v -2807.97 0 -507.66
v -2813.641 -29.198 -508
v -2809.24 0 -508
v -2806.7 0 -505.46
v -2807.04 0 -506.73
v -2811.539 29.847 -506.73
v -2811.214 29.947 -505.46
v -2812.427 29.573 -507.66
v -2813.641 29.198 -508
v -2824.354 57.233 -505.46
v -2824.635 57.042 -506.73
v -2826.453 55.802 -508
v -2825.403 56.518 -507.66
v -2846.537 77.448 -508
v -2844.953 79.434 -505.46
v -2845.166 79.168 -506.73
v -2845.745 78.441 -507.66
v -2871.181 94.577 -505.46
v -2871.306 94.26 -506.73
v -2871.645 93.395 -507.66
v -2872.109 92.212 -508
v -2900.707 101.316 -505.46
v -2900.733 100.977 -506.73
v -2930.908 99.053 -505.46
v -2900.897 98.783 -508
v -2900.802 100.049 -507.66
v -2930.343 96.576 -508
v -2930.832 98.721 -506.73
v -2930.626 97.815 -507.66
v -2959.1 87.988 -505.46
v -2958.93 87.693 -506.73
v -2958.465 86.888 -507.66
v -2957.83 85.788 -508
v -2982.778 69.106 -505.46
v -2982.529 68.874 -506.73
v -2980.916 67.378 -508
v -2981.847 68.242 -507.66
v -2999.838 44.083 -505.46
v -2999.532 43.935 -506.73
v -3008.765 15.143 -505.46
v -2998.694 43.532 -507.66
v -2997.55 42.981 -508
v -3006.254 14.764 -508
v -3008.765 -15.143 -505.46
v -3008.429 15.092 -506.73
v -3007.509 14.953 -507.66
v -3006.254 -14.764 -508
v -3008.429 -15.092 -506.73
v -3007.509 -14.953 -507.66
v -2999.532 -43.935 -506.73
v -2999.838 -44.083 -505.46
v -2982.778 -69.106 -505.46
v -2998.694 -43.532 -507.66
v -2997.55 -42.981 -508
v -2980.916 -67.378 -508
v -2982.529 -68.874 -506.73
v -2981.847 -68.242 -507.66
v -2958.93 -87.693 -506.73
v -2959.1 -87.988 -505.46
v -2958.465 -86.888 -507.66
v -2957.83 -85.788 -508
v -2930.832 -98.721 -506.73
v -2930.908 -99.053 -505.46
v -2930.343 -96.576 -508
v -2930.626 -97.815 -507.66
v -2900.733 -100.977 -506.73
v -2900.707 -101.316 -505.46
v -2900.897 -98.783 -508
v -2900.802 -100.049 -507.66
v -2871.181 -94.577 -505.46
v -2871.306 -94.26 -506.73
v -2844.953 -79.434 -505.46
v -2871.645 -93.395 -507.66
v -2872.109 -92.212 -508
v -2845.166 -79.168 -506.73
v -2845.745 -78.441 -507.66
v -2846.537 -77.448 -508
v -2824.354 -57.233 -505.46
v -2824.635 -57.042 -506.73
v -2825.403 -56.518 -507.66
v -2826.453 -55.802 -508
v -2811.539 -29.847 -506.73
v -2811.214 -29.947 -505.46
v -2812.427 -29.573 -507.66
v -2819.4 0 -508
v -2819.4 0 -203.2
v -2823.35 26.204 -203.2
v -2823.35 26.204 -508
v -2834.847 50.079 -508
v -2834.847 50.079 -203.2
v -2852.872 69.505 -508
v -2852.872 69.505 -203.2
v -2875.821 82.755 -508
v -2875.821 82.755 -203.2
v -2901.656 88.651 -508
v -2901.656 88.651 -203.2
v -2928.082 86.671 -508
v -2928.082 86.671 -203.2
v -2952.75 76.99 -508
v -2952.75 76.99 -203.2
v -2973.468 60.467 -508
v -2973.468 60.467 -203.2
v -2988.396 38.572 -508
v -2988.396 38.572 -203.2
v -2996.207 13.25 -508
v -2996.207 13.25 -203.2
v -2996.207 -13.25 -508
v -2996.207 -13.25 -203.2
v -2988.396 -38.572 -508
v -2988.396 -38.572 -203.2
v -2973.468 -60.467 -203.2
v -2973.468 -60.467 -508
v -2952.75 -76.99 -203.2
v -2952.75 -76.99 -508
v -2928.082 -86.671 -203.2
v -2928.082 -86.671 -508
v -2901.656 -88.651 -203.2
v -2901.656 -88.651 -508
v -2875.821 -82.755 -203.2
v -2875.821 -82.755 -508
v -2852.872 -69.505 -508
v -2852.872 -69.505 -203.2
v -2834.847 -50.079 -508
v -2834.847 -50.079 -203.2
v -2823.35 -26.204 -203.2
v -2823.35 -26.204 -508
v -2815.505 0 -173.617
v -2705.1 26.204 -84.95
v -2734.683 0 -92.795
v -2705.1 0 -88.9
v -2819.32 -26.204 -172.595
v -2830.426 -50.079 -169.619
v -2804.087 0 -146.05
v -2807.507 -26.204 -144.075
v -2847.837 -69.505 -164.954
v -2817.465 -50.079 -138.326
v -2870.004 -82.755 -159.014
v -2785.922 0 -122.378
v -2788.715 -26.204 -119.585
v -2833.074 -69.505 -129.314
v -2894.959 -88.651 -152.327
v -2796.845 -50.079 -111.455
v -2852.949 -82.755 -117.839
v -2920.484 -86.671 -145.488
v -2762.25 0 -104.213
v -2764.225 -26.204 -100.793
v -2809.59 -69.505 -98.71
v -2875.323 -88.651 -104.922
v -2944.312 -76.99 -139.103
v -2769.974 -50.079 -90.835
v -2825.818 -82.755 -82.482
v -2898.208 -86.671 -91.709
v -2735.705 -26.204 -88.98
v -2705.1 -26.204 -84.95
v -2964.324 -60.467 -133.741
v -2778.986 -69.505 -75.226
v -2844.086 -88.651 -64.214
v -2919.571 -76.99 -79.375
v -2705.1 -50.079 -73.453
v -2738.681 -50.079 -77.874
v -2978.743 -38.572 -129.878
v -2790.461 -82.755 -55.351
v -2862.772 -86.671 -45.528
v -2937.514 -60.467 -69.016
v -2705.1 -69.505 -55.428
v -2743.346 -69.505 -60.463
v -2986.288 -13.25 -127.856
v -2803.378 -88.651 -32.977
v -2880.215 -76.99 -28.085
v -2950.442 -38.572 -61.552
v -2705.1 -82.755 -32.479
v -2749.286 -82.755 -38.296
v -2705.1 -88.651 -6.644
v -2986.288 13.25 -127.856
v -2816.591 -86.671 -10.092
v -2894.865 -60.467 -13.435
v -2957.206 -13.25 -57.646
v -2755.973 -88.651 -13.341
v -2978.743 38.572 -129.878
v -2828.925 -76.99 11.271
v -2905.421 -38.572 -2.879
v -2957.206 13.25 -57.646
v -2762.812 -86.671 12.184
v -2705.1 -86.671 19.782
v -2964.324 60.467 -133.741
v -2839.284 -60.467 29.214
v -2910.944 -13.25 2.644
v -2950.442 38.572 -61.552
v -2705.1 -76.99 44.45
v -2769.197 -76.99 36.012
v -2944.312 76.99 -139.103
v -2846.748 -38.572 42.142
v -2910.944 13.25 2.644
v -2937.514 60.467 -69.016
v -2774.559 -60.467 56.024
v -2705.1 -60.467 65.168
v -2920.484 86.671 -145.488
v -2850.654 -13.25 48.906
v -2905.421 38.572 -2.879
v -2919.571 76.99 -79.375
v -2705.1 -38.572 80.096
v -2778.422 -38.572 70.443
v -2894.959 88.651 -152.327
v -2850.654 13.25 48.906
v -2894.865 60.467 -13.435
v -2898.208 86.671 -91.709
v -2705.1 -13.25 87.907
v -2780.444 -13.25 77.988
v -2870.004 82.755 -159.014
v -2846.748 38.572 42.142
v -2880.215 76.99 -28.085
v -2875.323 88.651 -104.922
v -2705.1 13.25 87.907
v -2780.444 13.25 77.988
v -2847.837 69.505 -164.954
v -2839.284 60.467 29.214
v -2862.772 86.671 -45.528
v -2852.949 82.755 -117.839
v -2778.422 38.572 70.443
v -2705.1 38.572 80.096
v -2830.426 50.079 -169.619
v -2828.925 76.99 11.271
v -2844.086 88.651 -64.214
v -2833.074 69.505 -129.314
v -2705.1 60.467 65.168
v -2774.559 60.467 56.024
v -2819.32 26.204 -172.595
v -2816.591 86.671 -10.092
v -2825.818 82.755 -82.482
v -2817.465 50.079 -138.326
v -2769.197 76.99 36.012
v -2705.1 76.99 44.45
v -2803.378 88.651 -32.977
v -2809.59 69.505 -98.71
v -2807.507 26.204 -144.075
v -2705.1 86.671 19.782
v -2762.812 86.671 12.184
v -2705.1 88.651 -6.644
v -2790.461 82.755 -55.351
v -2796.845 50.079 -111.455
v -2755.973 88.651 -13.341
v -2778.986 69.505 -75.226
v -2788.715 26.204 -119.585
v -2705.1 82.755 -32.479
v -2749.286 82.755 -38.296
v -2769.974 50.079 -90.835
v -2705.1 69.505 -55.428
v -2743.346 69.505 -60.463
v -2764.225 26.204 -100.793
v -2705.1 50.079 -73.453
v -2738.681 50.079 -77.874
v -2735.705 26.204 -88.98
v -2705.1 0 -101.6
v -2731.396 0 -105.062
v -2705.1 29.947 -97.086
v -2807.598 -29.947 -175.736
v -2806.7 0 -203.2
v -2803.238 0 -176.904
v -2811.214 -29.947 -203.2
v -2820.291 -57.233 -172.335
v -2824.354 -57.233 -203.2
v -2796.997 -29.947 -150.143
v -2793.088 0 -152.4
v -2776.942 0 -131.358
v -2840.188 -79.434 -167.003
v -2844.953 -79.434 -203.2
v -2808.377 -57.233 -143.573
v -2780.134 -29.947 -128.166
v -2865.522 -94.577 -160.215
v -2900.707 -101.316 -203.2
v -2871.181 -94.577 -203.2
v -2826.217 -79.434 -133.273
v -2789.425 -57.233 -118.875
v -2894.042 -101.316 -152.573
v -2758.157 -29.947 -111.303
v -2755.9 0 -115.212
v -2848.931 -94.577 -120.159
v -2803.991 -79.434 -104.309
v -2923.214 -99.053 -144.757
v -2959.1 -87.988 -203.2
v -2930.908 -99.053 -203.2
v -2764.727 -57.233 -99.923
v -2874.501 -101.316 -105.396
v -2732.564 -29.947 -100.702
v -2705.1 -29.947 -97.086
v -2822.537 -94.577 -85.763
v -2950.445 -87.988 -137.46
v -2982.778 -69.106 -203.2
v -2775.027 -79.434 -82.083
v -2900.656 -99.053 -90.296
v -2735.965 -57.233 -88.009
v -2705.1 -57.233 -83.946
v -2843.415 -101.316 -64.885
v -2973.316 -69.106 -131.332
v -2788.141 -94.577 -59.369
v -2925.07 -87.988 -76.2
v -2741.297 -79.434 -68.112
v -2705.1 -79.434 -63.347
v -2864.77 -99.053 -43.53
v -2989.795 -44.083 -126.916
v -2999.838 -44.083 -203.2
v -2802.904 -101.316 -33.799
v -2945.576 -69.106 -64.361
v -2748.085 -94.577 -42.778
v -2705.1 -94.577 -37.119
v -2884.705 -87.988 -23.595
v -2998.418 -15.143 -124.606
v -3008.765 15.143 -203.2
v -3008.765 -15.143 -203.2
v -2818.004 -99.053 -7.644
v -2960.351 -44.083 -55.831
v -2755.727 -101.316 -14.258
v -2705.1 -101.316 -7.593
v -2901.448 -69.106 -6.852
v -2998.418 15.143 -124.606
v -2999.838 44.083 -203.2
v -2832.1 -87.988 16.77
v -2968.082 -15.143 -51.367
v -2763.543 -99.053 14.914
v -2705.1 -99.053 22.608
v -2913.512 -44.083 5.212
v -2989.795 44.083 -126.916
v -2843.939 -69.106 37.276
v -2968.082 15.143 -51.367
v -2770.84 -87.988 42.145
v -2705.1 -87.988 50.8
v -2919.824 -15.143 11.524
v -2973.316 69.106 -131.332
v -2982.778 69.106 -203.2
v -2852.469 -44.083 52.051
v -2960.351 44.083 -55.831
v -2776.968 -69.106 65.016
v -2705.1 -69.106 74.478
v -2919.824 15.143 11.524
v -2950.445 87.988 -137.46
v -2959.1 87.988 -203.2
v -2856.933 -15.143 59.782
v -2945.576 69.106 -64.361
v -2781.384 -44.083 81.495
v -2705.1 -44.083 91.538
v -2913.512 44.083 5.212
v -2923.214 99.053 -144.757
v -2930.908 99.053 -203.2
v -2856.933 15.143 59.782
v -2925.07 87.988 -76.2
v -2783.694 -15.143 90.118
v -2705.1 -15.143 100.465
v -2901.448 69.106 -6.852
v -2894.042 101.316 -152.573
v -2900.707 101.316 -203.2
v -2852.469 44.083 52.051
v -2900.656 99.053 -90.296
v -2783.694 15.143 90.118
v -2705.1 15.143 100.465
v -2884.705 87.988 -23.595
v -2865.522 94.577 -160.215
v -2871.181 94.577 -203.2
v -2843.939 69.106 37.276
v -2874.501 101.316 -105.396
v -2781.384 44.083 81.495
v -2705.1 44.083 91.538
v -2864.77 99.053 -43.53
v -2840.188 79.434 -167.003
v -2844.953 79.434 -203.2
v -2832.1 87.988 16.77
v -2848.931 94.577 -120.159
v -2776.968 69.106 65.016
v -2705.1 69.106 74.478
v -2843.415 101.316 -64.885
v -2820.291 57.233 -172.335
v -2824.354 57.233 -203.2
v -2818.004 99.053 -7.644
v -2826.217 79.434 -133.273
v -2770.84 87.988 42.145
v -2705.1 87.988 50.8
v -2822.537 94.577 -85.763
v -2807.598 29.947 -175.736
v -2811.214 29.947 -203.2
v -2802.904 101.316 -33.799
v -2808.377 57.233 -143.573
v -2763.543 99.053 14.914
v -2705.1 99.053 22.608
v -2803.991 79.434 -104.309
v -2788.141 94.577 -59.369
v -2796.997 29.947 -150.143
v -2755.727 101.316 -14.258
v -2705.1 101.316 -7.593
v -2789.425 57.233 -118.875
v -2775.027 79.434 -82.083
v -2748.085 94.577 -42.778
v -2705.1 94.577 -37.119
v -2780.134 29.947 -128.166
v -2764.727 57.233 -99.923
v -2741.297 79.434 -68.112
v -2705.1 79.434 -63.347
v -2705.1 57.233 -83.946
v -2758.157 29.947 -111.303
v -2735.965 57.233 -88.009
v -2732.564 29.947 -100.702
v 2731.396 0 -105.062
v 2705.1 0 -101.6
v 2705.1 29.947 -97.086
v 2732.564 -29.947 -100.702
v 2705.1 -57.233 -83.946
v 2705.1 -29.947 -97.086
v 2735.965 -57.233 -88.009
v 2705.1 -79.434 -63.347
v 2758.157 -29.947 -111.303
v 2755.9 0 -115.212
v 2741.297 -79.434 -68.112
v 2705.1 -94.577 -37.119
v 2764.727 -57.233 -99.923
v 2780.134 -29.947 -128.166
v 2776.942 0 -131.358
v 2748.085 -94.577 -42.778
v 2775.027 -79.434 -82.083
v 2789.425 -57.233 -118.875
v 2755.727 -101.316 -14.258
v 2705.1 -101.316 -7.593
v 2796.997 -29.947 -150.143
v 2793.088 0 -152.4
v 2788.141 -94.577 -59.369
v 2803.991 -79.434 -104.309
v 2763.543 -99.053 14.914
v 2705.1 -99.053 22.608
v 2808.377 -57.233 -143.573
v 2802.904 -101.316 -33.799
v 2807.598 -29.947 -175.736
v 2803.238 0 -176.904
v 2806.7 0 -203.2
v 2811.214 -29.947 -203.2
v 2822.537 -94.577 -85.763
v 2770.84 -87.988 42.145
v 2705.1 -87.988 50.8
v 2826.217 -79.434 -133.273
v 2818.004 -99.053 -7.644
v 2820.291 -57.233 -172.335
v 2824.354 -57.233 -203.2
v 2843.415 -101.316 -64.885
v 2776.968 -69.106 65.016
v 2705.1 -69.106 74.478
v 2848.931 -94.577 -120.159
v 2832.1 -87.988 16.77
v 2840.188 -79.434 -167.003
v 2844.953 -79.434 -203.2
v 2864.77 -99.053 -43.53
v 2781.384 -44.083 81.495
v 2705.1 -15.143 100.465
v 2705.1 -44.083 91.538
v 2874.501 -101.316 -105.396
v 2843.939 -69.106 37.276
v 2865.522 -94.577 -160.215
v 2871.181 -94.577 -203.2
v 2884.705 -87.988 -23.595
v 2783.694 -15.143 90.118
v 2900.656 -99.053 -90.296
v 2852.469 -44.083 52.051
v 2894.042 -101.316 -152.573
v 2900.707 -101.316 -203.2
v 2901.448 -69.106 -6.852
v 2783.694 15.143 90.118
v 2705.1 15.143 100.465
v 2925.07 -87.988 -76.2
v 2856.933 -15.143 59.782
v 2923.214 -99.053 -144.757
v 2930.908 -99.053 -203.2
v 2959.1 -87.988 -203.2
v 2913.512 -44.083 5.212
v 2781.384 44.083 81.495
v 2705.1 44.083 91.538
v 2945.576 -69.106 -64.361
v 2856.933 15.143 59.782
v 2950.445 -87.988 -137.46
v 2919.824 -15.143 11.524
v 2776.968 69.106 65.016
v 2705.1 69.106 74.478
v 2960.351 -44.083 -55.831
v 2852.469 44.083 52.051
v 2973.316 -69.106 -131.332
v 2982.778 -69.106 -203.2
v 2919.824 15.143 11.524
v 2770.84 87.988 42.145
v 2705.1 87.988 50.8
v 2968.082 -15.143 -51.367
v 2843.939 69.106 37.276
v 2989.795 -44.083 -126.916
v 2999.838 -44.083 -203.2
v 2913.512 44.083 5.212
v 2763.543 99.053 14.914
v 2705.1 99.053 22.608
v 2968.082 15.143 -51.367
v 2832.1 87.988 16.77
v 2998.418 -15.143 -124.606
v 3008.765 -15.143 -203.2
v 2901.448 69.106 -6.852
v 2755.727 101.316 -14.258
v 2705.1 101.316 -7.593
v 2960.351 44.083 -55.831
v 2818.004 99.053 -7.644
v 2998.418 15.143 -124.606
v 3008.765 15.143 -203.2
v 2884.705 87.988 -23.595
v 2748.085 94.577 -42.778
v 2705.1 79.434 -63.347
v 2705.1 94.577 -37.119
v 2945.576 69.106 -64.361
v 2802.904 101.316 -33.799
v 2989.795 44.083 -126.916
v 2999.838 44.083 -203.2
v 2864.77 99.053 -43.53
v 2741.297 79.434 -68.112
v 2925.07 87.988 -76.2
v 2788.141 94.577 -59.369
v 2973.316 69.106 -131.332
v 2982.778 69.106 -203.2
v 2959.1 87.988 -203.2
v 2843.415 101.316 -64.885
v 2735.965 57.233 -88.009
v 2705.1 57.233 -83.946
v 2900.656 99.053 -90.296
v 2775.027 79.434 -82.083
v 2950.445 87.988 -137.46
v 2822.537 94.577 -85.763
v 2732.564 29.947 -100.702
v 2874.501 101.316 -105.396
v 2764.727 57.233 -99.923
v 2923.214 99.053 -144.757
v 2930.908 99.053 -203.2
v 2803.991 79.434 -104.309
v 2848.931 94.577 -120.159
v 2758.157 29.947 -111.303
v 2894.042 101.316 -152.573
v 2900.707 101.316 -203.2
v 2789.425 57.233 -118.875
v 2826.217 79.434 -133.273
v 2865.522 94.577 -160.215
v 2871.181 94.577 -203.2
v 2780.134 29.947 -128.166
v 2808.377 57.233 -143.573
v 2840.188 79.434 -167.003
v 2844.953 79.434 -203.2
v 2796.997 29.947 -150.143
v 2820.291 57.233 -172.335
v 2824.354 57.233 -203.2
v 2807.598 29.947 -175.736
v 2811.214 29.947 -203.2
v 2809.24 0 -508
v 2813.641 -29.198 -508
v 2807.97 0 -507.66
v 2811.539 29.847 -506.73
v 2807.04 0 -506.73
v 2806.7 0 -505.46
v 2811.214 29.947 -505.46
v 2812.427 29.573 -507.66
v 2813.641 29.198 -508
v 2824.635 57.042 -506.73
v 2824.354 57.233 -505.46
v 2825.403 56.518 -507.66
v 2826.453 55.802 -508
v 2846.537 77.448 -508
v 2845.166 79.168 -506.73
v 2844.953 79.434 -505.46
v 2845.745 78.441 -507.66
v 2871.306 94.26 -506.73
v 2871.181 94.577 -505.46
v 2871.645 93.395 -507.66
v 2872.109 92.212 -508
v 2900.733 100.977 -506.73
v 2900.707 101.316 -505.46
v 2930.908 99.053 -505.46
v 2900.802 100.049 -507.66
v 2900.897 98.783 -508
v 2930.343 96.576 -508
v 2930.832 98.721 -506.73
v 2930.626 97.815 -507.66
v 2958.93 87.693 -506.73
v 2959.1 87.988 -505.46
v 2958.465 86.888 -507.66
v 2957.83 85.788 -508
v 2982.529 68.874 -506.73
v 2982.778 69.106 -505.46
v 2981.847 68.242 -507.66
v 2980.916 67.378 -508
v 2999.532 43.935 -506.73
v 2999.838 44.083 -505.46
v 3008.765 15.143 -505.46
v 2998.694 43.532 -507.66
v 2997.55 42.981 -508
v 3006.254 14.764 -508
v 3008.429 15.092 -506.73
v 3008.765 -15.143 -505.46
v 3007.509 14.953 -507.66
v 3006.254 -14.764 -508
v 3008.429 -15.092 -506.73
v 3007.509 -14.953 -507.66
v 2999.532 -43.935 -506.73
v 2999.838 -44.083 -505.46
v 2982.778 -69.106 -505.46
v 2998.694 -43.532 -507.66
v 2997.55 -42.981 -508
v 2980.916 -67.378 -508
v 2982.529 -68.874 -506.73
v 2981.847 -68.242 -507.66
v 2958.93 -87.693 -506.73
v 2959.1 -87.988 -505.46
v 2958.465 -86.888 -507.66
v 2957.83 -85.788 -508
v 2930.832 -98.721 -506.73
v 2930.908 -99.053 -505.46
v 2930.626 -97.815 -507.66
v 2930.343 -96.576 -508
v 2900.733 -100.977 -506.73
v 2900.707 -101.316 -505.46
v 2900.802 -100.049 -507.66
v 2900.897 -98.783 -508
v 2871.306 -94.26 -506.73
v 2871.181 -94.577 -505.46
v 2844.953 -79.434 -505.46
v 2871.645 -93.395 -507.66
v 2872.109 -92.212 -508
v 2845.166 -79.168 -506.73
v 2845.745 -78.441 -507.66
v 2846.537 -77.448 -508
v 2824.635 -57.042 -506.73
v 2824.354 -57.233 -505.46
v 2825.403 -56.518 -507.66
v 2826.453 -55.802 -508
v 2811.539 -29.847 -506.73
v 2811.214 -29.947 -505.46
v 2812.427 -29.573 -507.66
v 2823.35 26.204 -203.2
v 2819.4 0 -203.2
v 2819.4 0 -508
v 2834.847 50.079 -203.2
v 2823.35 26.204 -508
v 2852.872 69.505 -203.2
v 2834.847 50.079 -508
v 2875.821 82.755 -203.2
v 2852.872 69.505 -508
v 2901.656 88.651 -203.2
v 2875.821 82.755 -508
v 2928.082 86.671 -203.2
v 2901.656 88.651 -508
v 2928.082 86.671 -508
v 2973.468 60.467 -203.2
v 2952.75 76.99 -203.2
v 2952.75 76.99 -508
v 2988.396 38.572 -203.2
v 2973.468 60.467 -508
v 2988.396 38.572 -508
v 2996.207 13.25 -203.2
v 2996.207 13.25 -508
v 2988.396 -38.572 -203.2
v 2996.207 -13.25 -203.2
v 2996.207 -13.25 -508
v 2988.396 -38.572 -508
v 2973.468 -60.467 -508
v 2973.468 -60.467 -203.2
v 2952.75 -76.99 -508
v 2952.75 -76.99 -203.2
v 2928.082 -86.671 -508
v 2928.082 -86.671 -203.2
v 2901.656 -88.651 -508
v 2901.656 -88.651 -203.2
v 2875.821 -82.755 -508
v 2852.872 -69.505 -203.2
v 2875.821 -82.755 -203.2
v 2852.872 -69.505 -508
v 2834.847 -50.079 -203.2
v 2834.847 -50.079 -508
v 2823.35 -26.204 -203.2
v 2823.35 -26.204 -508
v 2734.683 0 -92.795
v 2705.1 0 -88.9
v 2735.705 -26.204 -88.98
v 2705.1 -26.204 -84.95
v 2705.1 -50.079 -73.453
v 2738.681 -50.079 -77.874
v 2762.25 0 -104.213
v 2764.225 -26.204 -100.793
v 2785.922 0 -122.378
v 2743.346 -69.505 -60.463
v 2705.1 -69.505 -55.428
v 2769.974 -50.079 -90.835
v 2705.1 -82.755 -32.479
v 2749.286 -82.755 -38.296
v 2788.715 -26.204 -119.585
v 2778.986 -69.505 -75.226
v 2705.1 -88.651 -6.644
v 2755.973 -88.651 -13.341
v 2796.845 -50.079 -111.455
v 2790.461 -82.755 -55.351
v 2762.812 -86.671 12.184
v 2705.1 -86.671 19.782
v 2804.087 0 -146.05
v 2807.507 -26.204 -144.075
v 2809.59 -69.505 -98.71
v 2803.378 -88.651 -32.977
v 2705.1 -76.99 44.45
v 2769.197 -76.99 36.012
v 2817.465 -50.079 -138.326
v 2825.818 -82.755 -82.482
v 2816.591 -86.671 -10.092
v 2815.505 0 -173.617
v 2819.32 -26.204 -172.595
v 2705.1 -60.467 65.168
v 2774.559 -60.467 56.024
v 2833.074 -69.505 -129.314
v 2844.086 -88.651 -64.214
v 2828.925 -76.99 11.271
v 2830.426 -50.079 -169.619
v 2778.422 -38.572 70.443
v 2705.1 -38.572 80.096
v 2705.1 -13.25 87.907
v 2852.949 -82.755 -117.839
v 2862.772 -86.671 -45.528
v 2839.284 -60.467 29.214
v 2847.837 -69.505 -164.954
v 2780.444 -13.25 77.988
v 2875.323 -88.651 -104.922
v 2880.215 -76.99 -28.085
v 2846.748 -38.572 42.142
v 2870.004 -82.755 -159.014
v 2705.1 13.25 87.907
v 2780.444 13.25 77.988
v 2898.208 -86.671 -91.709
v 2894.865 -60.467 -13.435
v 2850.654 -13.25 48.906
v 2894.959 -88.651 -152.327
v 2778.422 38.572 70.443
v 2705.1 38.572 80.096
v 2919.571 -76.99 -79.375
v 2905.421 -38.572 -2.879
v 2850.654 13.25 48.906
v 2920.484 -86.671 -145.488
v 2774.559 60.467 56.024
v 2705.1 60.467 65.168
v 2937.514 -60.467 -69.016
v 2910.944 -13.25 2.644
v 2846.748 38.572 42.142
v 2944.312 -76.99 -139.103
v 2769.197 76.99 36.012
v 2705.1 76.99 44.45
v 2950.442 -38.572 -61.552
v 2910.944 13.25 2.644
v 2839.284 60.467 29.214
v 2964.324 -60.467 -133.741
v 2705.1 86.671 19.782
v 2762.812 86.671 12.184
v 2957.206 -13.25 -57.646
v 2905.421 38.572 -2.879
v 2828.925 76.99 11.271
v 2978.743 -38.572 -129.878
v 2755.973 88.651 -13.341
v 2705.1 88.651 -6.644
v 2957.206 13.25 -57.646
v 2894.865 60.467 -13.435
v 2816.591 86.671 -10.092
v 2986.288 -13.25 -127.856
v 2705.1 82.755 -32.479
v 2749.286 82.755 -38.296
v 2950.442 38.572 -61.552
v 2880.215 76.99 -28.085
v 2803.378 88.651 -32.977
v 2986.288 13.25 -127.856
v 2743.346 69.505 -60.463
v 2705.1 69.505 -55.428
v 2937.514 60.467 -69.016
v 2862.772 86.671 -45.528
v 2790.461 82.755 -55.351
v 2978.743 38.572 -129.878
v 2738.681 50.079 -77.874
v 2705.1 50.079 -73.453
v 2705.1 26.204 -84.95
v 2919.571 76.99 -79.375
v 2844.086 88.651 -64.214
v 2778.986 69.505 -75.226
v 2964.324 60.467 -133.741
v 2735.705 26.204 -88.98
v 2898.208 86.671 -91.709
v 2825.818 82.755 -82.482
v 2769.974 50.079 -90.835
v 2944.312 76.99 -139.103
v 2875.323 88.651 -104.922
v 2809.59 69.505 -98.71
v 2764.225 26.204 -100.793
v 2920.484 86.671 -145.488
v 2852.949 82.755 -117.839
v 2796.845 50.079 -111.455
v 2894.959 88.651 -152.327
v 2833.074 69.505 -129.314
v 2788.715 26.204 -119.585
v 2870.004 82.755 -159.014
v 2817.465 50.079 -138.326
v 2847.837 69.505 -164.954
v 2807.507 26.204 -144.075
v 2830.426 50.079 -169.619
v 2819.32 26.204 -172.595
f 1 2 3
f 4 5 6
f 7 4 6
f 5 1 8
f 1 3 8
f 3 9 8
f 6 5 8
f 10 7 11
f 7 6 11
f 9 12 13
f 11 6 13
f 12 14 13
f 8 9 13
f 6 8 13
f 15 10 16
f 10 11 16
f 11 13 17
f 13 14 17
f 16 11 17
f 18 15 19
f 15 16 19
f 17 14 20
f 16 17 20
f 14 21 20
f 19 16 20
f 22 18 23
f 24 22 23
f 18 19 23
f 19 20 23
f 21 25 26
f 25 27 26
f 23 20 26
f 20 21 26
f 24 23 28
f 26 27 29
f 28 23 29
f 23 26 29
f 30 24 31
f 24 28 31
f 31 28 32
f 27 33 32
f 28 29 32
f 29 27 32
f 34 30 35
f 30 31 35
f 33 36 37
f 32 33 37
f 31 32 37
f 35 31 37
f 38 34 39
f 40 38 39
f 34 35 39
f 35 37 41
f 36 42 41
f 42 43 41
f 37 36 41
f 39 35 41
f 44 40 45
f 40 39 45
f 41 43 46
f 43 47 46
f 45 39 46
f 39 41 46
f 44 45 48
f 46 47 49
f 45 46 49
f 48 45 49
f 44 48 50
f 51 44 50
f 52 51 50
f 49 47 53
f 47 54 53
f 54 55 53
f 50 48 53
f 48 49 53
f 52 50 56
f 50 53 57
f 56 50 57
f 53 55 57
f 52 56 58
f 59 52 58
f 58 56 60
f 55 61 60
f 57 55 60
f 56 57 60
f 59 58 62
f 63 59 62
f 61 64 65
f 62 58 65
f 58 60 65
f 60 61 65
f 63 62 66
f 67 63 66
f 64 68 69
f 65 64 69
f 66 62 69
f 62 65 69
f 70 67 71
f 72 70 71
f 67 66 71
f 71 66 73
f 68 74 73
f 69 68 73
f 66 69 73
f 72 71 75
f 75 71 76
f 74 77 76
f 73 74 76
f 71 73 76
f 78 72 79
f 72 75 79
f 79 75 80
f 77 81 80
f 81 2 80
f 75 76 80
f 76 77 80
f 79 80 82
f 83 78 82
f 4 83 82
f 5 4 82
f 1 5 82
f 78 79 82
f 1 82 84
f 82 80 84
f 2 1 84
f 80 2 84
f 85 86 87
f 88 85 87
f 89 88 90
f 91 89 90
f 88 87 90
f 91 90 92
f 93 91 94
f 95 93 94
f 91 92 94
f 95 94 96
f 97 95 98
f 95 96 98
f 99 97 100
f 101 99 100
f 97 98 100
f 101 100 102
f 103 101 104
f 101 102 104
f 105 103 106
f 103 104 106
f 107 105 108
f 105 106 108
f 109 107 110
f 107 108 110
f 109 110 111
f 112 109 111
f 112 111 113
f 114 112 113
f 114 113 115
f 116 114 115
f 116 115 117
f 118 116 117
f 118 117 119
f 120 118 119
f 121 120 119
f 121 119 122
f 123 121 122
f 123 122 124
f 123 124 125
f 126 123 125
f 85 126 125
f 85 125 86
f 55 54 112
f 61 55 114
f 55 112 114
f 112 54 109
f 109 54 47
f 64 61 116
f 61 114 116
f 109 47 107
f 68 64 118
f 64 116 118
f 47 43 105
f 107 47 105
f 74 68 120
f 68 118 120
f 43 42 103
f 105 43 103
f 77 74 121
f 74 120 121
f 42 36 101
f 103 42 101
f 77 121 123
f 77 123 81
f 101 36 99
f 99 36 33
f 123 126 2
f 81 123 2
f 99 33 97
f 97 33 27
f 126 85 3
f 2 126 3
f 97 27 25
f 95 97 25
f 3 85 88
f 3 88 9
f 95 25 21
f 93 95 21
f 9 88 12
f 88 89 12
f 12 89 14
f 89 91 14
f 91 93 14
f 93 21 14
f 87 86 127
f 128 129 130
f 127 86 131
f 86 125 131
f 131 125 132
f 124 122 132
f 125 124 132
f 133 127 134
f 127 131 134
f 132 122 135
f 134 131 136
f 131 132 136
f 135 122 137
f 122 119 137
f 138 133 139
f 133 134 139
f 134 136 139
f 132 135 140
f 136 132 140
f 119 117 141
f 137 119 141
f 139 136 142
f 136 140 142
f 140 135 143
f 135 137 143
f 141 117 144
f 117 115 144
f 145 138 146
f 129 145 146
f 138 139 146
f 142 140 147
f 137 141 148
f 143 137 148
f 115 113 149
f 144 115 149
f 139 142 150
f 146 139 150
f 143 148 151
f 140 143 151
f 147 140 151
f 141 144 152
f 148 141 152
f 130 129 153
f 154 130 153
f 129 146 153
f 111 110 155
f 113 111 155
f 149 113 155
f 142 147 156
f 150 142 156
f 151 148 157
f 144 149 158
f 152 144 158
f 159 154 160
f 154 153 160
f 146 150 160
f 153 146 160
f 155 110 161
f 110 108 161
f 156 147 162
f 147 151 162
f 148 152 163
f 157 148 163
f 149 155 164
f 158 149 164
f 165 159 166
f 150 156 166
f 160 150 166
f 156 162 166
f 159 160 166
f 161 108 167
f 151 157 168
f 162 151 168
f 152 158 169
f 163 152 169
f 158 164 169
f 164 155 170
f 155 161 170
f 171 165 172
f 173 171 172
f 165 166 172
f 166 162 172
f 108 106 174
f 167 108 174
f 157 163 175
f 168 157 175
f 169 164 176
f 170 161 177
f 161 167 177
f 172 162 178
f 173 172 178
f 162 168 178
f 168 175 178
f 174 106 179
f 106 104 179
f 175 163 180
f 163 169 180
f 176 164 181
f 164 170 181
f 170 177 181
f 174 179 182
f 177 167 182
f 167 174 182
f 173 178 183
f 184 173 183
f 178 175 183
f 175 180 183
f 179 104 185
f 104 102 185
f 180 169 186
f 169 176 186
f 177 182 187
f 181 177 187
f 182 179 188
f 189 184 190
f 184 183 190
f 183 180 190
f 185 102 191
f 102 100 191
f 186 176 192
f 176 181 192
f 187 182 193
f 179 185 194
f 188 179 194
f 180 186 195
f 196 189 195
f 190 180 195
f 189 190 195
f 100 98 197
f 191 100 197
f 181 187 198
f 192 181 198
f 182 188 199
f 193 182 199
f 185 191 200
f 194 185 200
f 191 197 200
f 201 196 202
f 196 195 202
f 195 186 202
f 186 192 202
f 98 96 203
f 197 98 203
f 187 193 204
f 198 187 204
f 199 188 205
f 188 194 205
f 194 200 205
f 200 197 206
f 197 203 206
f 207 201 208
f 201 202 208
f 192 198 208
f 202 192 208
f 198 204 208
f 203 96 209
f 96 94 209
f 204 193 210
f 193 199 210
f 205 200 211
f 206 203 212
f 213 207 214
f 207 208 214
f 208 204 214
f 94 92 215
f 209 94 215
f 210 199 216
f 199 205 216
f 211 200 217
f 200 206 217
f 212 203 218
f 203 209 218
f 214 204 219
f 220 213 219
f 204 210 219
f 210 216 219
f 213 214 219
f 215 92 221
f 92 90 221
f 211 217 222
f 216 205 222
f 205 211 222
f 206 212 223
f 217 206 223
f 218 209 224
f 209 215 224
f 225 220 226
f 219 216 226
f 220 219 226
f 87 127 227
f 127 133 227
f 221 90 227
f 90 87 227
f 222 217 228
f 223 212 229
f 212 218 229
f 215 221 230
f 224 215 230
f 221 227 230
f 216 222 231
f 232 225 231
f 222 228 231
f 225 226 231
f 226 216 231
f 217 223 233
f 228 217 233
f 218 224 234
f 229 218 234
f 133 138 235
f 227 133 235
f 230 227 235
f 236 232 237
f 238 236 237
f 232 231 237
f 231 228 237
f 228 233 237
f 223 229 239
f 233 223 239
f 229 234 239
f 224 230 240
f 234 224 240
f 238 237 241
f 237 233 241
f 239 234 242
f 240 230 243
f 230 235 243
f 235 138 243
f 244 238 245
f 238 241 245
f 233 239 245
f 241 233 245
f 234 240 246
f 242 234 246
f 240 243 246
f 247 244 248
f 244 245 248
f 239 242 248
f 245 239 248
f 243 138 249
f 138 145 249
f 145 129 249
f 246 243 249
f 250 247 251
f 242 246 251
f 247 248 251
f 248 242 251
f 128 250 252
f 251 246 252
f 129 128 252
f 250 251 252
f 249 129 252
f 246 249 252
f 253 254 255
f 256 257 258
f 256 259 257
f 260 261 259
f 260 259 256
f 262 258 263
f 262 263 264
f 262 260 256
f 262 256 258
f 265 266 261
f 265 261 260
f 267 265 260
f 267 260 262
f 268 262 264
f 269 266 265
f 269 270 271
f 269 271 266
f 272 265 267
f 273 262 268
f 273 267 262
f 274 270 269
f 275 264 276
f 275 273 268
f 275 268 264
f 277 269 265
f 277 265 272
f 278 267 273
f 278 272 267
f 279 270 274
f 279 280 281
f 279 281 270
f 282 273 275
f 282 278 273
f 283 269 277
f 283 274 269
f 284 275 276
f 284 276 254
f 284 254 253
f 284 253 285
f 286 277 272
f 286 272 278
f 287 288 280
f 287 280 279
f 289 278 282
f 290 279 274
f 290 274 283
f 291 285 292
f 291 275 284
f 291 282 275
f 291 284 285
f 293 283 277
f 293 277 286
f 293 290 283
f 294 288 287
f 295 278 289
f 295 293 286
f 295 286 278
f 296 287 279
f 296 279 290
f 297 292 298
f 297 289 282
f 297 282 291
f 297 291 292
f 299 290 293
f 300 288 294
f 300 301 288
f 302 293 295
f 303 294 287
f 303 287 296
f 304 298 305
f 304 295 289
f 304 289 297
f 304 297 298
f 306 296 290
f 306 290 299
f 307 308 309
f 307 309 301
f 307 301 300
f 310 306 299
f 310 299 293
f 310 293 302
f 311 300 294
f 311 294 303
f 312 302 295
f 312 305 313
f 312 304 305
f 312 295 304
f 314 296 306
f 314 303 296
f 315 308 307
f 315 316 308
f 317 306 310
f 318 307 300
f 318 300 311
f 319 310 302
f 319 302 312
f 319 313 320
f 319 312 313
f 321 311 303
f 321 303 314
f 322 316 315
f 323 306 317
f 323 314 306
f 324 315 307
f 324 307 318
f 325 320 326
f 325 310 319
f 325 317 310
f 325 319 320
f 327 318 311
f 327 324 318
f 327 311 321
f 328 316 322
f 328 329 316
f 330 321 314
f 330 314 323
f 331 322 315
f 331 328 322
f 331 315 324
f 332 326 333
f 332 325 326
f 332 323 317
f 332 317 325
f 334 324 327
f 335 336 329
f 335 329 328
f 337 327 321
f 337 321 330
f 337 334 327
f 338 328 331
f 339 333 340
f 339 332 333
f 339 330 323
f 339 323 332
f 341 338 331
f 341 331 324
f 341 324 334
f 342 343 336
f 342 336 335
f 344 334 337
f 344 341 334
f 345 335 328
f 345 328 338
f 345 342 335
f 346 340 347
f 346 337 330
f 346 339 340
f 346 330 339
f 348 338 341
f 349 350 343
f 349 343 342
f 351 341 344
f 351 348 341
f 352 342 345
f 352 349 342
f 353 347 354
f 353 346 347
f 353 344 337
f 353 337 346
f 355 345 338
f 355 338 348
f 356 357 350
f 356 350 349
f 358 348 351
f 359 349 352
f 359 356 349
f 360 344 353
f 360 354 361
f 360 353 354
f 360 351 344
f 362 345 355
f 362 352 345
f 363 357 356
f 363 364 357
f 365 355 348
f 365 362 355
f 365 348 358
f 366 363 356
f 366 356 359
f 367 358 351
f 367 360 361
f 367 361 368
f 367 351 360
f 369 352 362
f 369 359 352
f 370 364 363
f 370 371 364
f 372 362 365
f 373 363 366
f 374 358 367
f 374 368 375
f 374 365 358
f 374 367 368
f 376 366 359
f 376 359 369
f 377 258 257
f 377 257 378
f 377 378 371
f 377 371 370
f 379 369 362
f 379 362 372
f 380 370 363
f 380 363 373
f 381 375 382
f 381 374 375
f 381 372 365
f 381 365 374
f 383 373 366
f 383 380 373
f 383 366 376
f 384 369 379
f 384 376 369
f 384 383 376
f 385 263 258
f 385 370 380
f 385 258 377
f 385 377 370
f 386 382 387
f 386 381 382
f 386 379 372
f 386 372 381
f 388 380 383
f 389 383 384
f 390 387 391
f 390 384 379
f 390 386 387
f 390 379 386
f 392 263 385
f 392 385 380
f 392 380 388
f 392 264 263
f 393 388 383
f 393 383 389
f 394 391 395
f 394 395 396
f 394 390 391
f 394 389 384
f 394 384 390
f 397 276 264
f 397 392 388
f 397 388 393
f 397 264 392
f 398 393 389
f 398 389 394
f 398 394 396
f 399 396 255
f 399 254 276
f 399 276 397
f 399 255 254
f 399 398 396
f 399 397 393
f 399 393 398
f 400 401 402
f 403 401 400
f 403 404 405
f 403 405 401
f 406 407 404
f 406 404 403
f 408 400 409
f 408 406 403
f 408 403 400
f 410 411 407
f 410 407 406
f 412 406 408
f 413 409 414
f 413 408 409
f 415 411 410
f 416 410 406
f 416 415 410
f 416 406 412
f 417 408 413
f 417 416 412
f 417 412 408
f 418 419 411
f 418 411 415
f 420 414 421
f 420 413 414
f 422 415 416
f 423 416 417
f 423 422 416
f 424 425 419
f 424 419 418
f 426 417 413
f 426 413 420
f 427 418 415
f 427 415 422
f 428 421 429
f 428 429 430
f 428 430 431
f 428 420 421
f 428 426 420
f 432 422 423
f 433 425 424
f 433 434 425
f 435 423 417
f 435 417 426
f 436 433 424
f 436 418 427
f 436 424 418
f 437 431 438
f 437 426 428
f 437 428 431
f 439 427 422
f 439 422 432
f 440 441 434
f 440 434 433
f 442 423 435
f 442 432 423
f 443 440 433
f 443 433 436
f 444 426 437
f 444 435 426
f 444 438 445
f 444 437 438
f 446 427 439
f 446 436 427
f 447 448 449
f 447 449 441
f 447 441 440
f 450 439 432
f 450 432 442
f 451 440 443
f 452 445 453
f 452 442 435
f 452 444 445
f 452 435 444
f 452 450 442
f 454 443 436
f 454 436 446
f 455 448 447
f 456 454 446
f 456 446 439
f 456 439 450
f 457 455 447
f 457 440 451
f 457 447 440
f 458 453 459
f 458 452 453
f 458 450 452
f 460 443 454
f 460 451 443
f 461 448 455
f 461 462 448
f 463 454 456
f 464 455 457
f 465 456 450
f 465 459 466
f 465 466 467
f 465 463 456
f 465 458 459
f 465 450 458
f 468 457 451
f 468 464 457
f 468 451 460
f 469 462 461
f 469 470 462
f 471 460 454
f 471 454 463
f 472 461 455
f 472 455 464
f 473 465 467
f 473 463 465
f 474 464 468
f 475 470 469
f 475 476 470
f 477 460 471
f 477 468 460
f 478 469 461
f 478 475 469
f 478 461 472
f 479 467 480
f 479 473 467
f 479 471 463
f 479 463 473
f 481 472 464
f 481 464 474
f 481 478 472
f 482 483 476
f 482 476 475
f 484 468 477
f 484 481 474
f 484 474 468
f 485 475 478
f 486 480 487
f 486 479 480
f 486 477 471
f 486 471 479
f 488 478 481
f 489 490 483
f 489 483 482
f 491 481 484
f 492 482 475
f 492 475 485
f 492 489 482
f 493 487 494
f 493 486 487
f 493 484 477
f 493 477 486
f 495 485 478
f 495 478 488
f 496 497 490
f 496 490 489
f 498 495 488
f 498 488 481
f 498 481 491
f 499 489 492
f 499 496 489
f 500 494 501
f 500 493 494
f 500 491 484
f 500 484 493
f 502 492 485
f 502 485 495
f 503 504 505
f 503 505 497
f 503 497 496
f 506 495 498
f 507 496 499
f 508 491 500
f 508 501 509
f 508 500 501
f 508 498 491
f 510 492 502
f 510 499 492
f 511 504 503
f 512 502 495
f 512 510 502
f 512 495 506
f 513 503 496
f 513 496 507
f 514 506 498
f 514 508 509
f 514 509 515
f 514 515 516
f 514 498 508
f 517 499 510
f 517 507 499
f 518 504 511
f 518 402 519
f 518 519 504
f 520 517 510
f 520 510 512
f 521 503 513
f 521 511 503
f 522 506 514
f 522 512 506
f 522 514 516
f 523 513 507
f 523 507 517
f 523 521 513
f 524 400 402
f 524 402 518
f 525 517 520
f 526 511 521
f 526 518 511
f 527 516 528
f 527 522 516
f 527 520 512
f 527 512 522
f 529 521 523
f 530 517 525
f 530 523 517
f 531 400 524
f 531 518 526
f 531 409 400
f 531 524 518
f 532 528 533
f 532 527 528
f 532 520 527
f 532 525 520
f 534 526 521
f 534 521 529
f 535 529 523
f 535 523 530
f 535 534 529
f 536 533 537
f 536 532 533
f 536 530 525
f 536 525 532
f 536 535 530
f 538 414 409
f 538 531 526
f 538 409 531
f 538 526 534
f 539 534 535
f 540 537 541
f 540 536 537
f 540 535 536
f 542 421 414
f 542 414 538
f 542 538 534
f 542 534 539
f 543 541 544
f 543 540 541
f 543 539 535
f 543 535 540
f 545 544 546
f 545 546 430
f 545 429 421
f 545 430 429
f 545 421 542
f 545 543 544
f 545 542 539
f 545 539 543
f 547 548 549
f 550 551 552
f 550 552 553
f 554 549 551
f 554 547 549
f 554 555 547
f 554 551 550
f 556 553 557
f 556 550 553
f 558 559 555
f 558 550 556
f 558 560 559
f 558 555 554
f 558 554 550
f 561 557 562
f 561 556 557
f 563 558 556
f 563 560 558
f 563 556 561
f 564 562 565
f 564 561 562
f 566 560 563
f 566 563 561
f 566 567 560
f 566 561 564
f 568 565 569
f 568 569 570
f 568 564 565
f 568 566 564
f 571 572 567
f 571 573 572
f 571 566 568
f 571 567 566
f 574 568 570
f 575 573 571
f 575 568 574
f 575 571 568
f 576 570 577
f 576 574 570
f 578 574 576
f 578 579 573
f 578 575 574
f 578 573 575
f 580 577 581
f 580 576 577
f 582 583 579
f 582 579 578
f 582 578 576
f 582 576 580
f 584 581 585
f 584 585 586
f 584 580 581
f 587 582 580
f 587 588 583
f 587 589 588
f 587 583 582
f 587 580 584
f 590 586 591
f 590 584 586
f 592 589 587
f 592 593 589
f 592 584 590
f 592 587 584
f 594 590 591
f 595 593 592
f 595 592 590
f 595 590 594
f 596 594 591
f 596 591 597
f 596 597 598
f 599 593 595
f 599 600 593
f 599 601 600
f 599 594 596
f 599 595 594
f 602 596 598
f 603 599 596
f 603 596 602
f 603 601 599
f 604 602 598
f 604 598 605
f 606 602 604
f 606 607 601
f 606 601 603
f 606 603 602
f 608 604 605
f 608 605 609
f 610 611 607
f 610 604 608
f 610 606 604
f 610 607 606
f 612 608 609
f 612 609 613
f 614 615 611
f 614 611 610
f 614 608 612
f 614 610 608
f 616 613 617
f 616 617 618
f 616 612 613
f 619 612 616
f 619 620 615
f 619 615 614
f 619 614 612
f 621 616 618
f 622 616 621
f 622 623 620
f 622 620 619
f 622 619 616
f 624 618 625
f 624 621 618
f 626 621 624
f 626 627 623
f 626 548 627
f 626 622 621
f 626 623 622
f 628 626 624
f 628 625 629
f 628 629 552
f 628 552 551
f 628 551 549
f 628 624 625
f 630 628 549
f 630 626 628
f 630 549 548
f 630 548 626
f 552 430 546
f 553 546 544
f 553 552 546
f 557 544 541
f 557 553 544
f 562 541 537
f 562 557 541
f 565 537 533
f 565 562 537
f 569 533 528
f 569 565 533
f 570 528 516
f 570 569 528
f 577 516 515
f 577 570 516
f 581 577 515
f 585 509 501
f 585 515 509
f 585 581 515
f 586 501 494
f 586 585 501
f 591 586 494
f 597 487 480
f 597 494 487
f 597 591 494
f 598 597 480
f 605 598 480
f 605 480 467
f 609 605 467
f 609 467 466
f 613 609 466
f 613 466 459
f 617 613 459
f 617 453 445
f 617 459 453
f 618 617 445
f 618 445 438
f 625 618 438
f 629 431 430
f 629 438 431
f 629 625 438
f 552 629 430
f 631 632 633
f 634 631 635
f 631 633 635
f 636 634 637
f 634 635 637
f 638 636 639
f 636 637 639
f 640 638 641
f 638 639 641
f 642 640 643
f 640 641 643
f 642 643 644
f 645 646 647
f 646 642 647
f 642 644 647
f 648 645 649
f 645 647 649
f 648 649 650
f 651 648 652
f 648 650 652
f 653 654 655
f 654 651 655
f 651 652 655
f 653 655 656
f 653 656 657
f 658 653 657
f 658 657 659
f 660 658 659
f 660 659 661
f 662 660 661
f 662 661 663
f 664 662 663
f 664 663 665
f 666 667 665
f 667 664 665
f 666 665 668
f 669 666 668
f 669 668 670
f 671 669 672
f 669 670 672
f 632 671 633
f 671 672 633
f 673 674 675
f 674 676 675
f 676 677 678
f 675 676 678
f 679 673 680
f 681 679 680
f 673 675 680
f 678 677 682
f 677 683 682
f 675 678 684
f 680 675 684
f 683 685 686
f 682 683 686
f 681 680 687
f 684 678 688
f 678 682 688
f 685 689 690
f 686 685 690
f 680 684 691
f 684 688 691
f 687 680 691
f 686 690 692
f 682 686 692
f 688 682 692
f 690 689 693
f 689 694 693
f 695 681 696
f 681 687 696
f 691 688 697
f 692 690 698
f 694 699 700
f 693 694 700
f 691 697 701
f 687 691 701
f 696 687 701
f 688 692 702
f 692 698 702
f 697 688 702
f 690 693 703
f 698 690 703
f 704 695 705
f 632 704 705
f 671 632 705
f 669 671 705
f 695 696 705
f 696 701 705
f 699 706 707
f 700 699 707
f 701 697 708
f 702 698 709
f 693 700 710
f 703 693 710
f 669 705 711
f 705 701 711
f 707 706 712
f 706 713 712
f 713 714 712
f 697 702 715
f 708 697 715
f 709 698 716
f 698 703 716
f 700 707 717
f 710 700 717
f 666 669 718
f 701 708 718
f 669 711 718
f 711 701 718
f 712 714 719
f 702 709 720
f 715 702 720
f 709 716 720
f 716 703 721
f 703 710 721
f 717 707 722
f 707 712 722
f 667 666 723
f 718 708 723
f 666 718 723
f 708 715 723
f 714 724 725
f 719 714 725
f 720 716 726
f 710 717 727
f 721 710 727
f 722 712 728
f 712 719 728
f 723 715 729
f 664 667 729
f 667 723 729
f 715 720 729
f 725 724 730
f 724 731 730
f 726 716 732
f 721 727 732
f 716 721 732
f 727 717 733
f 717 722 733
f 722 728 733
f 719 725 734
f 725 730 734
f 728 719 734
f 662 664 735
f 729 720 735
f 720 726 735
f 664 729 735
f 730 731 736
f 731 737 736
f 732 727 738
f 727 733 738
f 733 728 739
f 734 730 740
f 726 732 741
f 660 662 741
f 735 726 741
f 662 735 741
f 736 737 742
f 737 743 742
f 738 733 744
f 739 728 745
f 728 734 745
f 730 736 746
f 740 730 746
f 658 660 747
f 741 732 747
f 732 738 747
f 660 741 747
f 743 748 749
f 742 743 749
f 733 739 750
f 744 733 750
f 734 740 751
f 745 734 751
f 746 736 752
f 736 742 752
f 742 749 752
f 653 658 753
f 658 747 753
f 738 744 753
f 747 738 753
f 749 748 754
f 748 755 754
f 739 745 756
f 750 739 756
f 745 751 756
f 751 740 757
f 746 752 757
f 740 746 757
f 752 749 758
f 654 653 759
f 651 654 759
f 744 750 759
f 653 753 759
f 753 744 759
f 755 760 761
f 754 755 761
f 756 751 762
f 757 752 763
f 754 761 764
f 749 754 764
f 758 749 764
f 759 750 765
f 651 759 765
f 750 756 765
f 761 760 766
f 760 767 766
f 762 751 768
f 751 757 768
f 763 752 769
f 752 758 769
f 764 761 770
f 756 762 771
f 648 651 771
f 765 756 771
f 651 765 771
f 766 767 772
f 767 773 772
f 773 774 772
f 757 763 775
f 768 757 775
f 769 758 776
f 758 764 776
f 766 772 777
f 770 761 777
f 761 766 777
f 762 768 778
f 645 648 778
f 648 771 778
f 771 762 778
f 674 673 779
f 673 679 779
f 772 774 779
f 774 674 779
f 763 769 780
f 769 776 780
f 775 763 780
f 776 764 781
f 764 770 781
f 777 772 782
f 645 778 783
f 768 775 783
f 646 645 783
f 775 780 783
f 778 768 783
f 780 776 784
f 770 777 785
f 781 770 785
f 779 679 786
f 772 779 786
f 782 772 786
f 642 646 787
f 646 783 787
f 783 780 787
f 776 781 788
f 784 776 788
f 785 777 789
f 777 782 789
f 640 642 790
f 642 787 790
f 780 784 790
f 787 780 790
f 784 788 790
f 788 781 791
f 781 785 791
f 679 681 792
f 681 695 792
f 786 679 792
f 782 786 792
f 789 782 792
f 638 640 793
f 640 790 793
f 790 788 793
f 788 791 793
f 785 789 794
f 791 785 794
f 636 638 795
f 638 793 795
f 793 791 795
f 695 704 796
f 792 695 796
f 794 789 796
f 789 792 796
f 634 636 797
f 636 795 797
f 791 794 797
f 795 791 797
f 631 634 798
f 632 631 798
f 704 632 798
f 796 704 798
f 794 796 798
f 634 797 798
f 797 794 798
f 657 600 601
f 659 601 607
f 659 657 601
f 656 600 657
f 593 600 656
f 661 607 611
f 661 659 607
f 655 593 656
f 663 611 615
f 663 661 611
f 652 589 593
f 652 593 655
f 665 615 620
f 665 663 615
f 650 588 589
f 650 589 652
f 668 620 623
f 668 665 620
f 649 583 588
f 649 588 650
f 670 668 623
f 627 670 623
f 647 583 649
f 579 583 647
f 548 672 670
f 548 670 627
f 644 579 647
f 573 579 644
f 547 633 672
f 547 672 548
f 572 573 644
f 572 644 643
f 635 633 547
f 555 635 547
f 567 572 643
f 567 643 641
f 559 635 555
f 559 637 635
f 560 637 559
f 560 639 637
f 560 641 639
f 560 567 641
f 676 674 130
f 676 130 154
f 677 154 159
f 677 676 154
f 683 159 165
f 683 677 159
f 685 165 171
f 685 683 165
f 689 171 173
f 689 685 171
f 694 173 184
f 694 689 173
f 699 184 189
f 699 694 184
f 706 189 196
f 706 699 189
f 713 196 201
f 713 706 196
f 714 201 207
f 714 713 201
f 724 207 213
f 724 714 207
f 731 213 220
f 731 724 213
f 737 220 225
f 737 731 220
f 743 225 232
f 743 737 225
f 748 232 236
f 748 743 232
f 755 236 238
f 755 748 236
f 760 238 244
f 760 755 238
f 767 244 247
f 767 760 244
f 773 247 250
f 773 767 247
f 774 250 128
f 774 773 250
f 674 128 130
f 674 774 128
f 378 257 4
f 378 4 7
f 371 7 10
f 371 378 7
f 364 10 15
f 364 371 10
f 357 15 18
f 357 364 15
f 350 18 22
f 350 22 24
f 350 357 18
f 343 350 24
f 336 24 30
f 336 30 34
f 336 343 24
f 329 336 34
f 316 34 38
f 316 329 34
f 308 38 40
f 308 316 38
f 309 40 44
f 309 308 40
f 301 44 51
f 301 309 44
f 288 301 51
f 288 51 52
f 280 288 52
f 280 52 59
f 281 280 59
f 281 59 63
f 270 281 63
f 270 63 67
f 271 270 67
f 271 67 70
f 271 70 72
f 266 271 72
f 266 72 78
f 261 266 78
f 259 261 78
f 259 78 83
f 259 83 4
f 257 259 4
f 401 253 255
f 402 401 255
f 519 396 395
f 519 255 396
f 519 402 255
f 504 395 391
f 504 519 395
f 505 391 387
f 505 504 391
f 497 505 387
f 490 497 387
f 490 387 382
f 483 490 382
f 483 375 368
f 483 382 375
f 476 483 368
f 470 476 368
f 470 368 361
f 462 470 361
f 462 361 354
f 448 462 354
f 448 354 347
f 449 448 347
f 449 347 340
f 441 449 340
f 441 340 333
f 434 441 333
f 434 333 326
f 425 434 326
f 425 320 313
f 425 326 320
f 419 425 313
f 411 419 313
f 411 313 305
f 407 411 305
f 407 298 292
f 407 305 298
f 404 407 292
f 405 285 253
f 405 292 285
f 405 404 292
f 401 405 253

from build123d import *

# Parameters (mm, degrees)
SKETCH2_R   = 101.6
SKETCH2_R_2 = 88.9
FILLET1_R   = 2.54


with BuildPart() as part:
    # Sweep1: sweep along a path in Sketch1
    with BuildLine(Plane(origin=(0, 0, 0), x_dir=(1, 0, 0), z_dir=(0, 1, 0))) as sweep1_path:
        Line((-2908.3, 508), (-2908.3, 203.2))
        ThreePointArc((-2908.3, 203.2), (-2848.784097937, 59.515902063), (-2705.1, 0))
        Line((-2705.1, 0), (2705.1, 0))
        ThreePointArc((2705.1, 0), (2848.784097937, 59.515902063), (2908.3, 203.2))
        Line((2908.3, 203.2), (2908.3, 508))
    # Sketch2 → Sweep1 (sweep)
    with BuildSketch(Plane.XY.offset(-508)):
        with Locations((-2908.3, 0)):
            Circle(SKETCH2_R)
        with Locations((-2908.3, 0)):
            Circle(SKETCH2_R_2, mode=Mode.SUBTRACT)
    sweep(path=sweep1_path.line)

    # Fillet1
    fillet1_edges = [part.edges().sort_by_distance(p)[0] for p in [
        (3009.9, 0, -508),
        (-3009.9, 0, -508),
    ]]
    fillet(fillet1_edges, radius=FILLET1_R)


solid = part.part
